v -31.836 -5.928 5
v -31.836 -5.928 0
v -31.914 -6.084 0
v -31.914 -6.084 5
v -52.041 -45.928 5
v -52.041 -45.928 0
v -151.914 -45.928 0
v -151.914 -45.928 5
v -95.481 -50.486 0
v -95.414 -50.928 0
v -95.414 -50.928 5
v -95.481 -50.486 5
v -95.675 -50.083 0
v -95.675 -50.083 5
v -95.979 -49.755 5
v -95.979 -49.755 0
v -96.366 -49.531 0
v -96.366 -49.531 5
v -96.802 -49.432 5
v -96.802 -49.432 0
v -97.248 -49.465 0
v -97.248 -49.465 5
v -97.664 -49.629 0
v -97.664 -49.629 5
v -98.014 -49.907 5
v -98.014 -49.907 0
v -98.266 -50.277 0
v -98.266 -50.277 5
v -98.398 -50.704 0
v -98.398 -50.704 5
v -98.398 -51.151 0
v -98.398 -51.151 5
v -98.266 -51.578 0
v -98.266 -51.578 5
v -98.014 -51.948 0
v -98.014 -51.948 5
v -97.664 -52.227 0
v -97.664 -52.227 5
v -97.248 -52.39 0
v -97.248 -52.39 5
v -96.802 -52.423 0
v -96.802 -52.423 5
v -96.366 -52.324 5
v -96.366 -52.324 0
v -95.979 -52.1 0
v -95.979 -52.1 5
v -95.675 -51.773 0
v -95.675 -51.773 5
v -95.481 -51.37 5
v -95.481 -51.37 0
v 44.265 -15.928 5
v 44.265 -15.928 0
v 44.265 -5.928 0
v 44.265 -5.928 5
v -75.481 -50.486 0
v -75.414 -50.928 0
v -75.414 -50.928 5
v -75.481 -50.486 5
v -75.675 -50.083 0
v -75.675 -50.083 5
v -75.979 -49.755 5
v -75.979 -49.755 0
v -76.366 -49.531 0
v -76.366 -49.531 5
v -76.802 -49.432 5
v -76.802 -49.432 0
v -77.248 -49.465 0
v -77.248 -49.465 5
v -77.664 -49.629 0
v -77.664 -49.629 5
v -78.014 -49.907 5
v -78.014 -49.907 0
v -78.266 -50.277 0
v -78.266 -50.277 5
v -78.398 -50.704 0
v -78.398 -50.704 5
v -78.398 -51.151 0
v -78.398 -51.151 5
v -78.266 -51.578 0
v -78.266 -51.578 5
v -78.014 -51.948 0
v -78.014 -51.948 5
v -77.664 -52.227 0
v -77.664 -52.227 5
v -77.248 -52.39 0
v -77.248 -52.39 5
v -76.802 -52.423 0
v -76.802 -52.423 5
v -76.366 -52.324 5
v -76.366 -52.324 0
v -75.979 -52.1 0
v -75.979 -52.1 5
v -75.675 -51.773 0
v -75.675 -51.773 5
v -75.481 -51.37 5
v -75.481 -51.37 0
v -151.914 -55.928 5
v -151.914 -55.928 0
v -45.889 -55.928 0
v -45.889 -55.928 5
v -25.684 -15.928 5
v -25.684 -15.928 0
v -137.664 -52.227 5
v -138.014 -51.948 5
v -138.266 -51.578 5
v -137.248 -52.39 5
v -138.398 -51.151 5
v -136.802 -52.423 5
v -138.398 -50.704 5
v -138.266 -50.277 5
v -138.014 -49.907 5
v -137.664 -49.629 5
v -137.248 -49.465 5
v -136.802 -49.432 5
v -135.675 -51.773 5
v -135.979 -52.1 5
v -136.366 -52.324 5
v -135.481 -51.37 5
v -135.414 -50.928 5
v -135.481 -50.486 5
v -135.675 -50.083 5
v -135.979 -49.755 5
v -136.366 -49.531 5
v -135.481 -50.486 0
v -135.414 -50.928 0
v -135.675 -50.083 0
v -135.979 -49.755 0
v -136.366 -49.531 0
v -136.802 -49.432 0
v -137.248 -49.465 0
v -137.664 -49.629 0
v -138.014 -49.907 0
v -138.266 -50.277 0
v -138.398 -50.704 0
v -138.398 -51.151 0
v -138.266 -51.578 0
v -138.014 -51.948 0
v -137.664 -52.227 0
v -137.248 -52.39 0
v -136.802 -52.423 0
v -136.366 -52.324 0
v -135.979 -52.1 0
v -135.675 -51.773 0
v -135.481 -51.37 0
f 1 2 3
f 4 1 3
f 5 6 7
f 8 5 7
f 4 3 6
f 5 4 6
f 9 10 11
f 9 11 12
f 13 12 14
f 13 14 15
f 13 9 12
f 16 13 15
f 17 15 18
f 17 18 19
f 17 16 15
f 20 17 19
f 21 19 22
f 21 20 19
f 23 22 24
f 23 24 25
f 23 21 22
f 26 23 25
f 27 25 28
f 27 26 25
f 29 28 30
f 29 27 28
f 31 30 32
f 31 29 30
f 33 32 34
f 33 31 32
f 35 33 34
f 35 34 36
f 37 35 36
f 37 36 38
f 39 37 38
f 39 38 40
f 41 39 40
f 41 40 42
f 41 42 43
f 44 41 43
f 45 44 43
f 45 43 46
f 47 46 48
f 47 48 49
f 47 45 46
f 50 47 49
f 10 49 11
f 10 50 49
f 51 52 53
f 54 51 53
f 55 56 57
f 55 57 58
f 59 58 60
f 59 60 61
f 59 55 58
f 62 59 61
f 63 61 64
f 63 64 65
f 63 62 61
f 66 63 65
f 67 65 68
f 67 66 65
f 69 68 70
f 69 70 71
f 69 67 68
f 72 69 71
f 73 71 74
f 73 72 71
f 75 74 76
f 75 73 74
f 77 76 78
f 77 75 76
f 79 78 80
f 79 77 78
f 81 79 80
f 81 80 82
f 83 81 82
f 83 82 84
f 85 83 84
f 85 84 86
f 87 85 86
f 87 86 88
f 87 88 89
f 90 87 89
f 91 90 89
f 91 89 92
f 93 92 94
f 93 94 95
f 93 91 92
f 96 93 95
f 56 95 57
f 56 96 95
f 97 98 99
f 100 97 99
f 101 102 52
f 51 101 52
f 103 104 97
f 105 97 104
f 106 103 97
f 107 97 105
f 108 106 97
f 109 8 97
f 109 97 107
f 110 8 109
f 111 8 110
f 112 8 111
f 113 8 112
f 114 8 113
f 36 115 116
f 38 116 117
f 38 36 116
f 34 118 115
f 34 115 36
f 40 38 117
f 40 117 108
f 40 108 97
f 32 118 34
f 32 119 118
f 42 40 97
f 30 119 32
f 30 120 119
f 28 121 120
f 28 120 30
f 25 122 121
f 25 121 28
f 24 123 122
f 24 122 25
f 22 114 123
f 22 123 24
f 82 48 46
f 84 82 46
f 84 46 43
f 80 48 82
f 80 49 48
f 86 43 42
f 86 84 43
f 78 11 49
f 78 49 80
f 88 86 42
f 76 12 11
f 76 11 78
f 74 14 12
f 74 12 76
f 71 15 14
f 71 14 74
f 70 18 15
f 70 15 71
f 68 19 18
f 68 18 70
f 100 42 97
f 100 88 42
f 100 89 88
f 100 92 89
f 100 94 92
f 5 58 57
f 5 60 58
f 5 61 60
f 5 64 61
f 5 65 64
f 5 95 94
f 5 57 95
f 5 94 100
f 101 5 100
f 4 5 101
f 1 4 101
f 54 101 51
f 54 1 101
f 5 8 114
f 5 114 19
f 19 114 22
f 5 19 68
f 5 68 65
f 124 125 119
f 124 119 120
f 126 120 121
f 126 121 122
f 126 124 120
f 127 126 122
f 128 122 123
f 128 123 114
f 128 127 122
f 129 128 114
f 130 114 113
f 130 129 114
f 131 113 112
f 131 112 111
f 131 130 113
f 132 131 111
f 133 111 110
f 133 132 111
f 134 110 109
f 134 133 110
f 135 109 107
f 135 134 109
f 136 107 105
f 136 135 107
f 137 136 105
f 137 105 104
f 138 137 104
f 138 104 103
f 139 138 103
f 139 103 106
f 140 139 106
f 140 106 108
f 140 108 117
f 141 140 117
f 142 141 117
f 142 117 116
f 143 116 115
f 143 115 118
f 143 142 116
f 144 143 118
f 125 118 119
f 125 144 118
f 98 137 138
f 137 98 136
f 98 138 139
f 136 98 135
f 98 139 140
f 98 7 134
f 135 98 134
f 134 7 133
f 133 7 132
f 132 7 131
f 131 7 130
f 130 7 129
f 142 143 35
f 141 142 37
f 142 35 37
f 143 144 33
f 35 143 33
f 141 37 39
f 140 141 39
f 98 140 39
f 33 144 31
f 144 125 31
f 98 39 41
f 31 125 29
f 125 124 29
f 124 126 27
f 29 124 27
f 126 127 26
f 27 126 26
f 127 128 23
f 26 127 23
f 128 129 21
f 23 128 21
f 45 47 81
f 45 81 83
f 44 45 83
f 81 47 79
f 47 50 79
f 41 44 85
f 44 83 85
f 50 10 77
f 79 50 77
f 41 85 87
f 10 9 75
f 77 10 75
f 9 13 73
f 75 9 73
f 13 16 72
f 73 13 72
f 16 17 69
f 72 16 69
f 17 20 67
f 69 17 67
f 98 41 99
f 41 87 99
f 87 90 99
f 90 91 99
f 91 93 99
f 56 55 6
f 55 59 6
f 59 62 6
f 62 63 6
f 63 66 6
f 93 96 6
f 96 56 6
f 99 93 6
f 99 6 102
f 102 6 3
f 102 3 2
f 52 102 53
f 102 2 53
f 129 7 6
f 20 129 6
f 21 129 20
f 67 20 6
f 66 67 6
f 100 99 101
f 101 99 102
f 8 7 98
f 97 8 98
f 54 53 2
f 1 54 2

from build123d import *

# Parameters (mm, degrees)
F0_R     = 1.5
F1_DEPTH = 5
F2_DEPTH = 265


# Not quite as in the source:
# - an extrude ends at something that could not be found from the text; its depth is read off the source's solid


with BuildPart() as f1:
    # F0 (on Top) → F1 (new body)
    with BuildSketch(Plane.XY):
        Polygon((-52.0408339798, -45.9276453106), (-151.9144345724, -45.9276453106), (-151.9144345724, -55.9276454151), (-45.8887560524, -55.9276454151), (-25.683571109, -15.9276453106), (27.9570557177, -15.9276453106), (44.264588505, -15.9276453106), (44.264588505, -5.9276453106), (27.9570557177, -5.9276453106), (-31.8356490892, -5.9276453106), (-31.9144345724, -6.0836161342), align=None)
        with Locations((-136.9144345724, -50.9276454151)):
            Circle(F0_R, mode=Mode.SUBTRACT)
        with Locations((-96.9144345724, -50.9276454151)):
            Circle(F0_R, mode=Mode.SUBTRACT)
        with Locations((-76.9144345724, -50.9276454151)):
            Circle(F0_R, mode=Mode.SUBTRACT)
    extrude(amount=F1_DEPTH)

    # F0 (on Top) → F2 (cut, through all)
    with BuildSketch(Plane.XY):
        with Locations((-76.9144345724, -50.9276454151)):
            Circle(F0_R)
        with Locations((-96.9144345724, -50.9276454151)):
            Circle(F0_R)
    extrude(amount=-F2_DEPTH, mode=Mode.SUBTRACT)


solid = f1.part
